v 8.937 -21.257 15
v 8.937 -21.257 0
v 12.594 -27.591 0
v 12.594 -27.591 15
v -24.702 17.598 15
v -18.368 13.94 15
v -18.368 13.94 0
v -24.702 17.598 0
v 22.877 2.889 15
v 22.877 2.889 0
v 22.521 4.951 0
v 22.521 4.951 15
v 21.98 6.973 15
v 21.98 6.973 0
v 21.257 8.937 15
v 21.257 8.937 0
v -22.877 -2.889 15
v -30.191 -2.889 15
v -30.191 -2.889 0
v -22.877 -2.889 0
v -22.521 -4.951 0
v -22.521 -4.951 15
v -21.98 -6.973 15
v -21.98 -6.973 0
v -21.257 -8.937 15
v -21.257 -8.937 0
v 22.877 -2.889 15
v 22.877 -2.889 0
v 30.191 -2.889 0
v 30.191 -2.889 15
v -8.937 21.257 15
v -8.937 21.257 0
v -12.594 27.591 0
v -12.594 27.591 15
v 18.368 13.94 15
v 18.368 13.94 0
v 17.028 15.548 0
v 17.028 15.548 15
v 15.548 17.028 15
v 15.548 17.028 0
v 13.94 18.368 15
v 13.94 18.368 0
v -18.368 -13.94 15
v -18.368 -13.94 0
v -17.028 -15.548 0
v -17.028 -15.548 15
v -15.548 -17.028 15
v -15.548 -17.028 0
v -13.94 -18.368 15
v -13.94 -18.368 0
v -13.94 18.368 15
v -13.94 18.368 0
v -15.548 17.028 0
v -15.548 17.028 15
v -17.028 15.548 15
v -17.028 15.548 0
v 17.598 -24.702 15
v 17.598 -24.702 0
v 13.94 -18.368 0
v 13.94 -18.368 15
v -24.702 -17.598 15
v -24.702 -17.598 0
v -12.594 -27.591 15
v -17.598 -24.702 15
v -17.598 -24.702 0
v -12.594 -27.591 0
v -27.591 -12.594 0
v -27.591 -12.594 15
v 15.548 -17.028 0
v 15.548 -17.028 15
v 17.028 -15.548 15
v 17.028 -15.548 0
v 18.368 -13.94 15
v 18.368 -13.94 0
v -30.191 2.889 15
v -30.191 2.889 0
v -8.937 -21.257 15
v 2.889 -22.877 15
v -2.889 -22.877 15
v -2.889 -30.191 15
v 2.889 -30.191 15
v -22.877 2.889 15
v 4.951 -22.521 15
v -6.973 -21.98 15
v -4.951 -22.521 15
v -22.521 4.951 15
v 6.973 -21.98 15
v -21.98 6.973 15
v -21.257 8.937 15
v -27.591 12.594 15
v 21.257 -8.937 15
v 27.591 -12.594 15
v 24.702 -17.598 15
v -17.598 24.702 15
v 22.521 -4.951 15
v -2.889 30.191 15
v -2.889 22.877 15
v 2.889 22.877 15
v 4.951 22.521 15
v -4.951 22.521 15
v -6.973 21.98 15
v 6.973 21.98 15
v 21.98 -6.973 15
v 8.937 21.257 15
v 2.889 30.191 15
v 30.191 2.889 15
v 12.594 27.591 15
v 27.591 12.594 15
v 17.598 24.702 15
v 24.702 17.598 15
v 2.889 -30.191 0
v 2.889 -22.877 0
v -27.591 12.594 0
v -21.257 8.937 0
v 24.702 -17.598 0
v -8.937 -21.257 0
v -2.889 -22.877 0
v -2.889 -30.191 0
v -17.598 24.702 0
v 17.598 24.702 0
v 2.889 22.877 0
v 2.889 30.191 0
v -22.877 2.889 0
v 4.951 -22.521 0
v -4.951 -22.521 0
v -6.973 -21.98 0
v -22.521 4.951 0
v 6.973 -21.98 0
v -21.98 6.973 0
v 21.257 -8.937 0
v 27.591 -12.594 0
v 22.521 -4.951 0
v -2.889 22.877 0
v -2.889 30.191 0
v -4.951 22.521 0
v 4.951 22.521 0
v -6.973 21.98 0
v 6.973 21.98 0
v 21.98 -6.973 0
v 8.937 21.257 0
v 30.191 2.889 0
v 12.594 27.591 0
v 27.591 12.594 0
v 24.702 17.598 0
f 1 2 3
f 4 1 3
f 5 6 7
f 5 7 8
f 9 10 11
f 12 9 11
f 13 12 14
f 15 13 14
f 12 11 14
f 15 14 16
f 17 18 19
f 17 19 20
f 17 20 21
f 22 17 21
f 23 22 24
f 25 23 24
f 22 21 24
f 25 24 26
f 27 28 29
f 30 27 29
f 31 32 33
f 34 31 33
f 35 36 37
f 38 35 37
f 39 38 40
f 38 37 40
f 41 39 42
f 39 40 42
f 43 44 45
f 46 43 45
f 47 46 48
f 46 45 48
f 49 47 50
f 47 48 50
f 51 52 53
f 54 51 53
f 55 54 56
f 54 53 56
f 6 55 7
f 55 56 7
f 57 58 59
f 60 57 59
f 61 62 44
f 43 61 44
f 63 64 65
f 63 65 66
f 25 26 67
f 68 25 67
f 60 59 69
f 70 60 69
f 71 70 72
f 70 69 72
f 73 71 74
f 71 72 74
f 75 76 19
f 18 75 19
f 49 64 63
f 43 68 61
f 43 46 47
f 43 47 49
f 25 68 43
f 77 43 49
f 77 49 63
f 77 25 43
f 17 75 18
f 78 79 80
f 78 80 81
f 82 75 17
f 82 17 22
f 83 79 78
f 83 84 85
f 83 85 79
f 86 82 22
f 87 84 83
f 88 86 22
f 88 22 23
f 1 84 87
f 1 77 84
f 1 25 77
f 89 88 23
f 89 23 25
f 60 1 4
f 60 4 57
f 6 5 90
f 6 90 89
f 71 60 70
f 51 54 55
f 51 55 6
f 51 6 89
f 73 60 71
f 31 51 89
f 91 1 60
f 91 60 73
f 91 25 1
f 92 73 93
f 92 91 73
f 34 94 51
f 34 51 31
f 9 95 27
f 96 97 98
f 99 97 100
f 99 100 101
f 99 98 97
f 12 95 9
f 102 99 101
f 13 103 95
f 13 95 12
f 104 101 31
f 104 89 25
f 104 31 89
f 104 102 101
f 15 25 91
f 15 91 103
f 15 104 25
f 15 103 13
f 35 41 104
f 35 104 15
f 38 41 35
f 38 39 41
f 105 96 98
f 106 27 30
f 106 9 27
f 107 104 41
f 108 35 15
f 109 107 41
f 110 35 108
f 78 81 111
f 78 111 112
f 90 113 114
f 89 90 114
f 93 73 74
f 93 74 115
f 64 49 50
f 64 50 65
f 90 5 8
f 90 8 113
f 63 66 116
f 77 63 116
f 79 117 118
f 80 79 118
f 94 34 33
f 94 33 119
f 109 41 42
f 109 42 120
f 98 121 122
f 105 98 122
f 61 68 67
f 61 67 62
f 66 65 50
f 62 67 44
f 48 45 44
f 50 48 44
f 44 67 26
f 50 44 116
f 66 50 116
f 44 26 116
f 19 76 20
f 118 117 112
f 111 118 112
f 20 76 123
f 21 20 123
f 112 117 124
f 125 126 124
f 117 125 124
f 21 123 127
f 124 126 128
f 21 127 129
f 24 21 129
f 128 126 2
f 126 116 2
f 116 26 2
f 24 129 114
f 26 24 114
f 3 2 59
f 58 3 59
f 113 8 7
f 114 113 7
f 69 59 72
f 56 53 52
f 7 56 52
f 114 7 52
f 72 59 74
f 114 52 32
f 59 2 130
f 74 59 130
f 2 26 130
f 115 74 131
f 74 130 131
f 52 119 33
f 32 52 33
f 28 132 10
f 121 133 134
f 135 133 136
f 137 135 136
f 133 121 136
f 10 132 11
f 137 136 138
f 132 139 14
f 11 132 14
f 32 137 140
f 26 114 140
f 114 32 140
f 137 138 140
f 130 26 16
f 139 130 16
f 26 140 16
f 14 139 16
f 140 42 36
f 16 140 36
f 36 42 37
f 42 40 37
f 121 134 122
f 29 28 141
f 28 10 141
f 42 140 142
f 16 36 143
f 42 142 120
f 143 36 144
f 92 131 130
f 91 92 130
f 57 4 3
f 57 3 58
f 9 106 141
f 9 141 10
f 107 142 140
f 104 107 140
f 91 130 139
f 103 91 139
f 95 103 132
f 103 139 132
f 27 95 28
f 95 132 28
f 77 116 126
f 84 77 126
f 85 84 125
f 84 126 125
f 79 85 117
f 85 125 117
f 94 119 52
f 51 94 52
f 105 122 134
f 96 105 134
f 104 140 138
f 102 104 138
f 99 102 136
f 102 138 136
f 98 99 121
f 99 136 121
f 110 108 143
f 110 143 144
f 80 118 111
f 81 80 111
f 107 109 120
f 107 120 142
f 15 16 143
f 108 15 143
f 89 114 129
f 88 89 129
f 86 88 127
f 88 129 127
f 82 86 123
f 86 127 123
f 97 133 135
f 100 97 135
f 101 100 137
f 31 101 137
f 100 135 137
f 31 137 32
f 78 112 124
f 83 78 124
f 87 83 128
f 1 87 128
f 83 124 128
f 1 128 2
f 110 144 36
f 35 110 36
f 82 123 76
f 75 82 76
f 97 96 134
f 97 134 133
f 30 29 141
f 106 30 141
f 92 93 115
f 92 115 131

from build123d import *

# Parameters (mm, degrees)
F1_DEPTH = 15


with BuildPart() as f1:
    # F0 (on Top) → F1 (new body)
    with BuildSketch(Plane.XY):
        with BuildLine():
            Line((-2.888783, 30.191496), (-2.888783, 22.877379))
            ThreePointArc((-2.888783, 22.877379), (-5.96812, 22.273326), (-8.93693, 21.256782))
            Line((-8.93693, 21.256782), (-12.593989, 27.590994))
            Line((-12.593989, 27.590994), (-17.597507, 24.702211))
            Line((-17.597507, 24.702211), (-13.940448, 18.368))
            ThreePointArc((-13.940448, 18.368), (-16.305207, 16.305207), (-18.368, 13.940448))
            Line((-18.368, 13.940448), (-24.702211, 17.597507))
            Line((-24.702211, 17.597507), (-27.590994, 12.593989))
            Line((-27.590994, 12.593989), (-21.256782, 8.93693))
            ThreePointArc((-21.256782, 8.93693), (-22.273326, 5.96812), (-22.877379, 2.888783))
            Line((-22.877379, 2.888783), (-30.191496, 2.888783))
            Line((-30.191496, 2.888783), (-30.191496, -2.888783))
            Line((-30.191496, -2.888783), (-22.877379, -2.888783))
            ThreePointArc((-22.877379, -2.888783), (-22.273326, -5.96812), (-21.256782, -8.93693))
            Line((-21.256782, -8.93693), (-27.590994, -12.593989))
            Line((-27.590994, -12.593989), (-24.702211, -17.597507))
            Line((-24.702211, -17.597507), (-18.368, -13.940448))
            ThreePointArc((-18.368, -13.940448), (-16.305207, -16.305207), (-13.940448, -18.368))
            Line((-13.940448, -18.368), (-17.597507, -24.702211))
            Line((-17.597507, -24.702211), (-12.593989, -27.590994))
            Line((-12.593989, -27.590994), (-8.93693, -21.256782))
            ThreePointArc((-8.93693, -21.256782), (-5.96812, -22.273326), (-2.888783, -22.877379))
            Line((-2.888783, -22.877379), (-2.888783, -30.191496))
            Line((-2.888783, -30.191496), (2.888783, -30.191496))
            Line((2.888783, -30.191496), (2.888783, -22.877379))
            ThreePointArc((2.888783, -22.877379), (5.96812, -22.273326), (8.93693, -21.256782))
            Line((8.93693, -21.256782), (12.593989, -27.590994))
            Line((12.593989, -27.590994), (17.597507, -24.702211))
            Line((17.597507, -24.702211), (13.940448, -18.368))
            ThreePointArc((13.940448, -18.368), (16.305207, -16.305207), (18.368, -13.940448))
            Line((18.368, -13.940448), (24.702211, -17.597507))
            Line((24.702211, -17.597507), (27.590994, -12.593989))
            Line((27.590994, -12.593989), (21.256782, -8.93693))
            ThreePointArc((21.256782, -8.93693), (22.273326, -5.96812), (22.877379, -2.888783))
            Line((22.877379, -2.888783), (30.191496, -2.888783))
            Line((30.191496, -2.888783), (30.191496, 2.888783))
            Line((30.191496, 2.888783), (22.877379, 2.888783))
            ThreePointArc((22.877379, 2.888783), (22.273326, 5.96812), (21.256782, 8.93693))
            Line((21.256782, 8.93693), (27.590994, 12.593989))
            Line((27.590994, 12.593989), (24.702211, 17.597507))
            Line((24.702211, 17.597507), (18.368, 13.940448))
            ThreePointArc((18.368, 13.940448), (16.305207, 16.305207), (13.940448, 18.368))
            Line((13.940448, 18.368), (17.597507, 24.702211))
            Line((17.597507, 24.702211), (12.593989, 27.590994))
            Line((12.593989, 27.590994), (8.93693, 21.256782))
            ThreePointArc((8.93693, 21.256782), (5.96812, 22.273326), (2.888783, 22.877379))
            Line((2.888783, 22.877379), (2.888783, 30.191496))
            Line((2.888783, 30.191496), (-2.888783, 30.191496))
        make_face()
    extrude(amount=F1_DEPTH)


solid = f1.part
